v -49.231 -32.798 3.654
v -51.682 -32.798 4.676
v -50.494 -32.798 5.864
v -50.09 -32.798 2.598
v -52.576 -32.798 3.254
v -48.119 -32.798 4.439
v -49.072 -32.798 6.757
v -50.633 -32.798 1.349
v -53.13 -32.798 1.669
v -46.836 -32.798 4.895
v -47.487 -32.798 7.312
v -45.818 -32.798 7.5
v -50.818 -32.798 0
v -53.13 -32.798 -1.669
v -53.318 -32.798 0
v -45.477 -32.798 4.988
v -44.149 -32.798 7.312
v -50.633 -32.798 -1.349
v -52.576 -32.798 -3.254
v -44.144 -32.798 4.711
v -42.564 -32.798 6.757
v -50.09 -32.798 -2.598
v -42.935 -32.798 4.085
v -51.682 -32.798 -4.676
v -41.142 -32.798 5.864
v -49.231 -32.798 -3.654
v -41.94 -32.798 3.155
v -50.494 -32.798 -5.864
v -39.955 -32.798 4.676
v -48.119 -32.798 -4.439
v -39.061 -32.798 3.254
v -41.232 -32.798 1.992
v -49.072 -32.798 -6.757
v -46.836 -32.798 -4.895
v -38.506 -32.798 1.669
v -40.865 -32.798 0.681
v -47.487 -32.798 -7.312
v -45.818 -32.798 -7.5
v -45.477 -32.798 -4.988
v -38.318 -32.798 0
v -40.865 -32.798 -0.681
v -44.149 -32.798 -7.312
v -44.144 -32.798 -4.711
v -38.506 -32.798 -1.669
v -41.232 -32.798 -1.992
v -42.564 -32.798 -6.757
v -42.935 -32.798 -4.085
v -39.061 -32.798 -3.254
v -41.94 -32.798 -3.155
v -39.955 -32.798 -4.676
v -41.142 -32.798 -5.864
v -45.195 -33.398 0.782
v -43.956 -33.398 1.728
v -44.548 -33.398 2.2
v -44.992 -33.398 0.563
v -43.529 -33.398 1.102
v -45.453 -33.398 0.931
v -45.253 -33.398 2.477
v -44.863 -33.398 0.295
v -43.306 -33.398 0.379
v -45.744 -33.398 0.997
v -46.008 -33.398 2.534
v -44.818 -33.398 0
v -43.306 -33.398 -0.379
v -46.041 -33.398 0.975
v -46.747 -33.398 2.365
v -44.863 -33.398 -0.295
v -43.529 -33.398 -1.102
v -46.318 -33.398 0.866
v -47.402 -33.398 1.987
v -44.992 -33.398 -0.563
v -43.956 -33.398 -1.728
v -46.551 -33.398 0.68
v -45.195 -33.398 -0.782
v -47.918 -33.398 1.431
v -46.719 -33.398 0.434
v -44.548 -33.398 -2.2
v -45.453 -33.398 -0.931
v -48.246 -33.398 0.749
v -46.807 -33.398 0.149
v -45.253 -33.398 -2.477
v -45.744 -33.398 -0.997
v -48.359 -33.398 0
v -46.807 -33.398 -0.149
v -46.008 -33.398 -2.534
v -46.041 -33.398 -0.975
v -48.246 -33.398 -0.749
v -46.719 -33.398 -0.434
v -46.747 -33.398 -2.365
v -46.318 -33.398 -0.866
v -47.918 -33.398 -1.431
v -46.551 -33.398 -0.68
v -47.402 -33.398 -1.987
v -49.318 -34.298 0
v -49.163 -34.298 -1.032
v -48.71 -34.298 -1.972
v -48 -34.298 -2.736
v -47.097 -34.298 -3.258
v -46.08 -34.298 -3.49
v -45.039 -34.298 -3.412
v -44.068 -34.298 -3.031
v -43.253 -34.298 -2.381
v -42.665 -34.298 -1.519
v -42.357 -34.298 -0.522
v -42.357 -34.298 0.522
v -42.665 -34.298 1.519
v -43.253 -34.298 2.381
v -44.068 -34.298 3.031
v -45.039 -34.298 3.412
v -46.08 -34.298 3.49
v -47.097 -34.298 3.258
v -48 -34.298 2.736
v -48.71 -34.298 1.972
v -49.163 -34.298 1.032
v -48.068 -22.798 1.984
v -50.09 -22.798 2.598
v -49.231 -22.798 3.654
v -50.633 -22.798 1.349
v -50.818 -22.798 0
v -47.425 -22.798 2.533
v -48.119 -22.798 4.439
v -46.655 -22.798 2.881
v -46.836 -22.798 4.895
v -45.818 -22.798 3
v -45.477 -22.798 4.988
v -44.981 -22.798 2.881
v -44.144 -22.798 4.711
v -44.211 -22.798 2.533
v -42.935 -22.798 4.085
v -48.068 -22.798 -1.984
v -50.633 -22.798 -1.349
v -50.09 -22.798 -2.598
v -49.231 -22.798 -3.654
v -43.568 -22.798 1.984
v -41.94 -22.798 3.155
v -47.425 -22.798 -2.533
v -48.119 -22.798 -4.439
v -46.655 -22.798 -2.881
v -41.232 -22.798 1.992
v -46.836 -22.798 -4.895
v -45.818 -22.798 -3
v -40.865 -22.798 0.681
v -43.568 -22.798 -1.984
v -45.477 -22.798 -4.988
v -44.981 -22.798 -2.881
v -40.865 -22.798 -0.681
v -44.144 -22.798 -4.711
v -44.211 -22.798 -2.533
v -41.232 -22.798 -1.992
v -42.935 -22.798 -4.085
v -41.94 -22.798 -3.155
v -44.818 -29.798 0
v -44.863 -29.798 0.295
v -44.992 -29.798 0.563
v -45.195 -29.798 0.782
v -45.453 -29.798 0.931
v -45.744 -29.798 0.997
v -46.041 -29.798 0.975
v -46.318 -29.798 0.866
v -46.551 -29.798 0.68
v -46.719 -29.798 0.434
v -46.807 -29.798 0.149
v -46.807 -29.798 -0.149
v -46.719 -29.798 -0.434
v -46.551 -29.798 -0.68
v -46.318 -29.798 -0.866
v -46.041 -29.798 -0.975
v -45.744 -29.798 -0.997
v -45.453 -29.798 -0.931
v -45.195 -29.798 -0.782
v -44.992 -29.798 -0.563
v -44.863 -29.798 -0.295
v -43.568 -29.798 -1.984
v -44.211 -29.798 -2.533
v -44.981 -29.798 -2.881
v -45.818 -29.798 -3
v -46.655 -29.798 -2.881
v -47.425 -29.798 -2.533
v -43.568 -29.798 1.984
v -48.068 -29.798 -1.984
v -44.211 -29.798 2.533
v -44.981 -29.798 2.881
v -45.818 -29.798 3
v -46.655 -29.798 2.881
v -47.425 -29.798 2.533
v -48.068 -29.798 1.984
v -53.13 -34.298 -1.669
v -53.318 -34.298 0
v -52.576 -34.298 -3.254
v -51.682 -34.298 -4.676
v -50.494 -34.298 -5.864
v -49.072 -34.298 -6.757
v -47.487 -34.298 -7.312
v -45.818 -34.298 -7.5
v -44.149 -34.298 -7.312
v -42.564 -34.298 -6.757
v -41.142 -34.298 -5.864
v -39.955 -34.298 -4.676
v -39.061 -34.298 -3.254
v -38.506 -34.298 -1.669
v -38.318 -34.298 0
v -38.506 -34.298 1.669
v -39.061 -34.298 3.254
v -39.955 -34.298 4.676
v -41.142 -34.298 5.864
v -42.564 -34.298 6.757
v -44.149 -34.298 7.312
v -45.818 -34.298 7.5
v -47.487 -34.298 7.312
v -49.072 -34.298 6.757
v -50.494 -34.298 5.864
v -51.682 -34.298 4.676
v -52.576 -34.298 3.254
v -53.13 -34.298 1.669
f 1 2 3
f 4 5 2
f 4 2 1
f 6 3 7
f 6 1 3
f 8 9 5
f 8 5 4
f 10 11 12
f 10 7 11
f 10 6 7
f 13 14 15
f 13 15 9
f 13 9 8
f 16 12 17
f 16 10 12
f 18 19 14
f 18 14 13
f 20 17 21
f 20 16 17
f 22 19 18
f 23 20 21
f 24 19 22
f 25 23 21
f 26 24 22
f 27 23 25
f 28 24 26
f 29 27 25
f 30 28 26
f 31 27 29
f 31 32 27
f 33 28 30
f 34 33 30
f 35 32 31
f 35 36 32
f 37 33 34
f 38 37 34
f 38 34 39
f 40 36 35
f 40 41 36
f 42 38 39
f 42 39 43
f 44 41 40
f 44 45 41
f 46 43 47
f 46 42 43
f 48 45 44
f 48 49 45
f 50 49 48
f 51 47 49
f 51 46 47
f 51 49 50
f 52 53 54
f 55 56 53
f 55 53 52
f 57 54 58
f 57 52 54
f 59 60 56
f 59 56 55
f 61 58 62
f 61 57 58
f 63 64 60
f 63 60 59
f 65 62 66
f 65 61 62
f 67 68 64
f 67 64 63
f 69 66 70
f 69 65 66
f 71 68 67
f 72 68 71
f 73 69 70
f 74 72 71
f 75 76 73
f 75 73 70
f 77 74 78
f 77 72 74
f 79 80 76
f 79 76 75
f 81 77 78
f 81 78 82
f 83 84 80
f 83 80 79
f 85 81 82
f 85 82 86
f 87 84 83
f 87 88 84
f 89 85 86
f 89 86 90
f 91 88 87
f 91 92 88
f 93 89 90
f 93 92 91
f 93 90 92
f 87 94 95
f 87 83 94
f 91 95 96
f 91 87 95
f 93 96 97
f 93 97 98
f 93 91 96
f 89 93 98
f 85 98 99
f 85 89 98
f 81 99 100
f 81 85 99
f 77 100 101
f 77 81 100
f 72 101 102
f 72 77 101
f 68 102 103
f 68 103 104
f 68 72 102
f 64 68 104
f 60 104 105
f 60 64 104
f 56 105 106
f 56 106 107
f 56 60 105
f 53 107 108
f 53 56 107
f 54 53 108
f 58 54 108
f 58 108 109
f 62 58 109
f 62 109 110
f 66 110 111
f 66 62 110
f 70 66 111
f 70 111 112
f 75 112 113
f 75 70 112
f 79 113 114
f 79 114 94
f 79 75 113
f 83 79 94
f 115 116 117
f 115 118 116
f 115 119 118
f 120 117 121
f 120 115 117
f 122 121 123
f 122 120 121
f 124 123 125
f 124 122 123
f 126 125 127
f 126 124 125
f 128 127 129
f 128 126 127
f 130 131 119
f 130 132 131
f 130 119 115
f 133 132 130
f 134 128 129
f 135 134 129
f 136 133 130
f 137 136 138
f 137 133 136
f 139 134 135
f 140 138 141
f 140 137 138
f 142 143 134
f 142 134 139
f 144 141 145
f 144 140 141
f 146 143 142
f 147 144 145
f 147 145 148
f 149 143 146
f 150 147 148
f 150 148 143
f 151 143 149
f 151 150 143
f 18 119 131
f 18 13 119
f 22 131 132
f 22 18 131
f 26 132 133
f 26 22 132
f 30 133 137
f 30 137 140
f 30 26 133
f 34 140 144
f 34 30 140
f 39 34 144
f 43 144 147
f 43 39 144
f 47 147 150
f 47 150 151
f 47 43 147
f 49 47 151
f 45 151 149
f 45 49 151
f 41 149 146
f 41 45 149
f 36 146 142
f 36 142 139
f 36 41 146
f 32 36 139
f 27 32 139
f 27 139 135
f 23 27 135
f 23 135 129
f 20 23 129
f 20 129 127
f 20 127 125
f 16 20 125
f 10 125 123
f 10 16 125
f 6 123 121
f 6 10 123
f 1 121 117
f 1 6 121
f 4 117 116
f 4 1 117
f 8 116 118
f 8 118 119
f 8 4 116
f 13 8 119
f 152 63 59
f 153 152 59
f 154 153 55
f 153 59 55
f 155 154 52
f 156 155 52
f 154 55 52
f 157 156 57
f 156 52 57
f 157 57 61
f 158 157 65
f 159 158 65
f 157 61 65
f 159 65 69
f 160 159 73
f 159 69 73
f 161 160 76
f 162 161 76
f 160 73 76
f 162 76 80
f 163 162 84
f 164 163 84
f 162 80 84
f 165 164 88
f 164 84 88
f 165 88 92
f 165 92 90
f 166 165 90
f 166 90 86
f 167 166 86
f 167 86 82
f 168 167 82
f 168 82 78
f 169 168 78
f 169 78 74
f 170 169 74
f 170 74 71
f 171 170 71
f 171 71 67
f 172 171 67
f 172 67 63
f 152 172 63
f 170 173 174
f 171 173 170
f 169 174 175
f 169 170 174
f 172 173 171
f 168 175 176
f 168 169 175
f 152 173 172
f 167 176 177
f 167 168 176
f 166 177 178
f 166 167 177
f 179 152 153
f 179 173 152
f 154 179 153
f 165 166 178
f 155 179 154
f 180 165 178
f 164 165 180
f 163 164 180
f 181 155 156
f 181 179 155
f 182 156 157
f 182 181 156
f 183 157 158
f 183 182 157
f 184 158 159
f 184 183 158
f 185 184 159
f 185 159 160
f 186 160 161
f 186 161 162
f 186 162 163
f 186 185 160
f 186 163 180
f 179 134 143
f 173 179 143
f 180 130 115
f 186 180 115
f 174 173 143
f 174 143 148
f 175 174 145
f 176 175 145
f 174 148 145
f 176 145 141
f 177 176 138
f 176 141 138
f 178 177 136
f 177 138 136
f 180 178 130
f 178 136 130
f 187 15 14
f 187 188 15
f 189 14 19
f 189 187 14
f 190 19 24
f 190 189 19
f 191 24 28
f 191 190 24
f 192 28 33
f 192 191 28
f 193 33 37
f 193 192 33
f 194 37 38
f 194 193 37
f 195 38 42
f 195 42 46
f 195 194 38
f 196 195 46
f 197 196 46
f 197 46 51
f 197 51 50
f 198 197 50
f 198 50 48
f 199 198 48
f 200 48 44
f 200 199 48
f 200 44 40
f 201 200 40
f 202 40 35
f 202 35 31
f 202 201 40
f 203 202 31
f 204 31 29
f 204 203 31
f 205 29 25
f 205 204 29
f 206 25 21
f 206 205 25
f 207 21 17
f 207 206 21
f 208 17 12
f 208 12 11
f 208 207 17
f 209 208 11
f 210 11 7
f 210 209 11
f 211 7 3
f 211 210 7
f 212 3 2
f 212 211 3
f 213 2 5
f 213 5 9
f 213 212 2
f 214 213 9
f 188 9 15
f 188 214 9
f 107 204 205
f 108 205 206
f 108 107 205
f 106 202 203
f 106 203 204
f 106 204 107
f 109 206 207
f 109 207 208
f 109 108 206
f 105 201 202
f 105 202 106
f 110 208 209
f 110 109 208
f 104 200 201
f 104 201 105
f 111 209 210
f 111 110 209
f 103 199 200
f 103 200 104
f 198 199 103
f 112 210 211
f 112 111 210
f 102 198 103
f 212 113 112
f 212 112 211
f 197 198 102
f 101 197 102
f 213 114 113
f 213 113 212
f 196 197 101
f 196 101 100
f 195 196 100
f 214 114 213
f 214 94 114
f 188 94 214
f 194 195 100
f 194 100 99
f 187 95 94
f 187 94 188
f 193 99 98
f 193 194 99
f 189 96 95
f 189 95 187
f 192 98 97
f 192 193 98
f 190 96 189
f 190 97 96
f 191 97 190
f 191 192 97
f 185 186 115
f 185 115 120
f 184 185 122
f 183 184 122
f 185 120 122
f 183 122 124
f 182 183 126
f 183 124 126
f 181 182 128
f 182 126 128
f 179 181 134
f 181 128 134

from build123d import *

# Parameters (mm, degrees)
F3_DEPTH = 7
F4_R     = 1
F5_DEPTH = 25


with BuildPart() as f1:
    # F0 (on Top) → F1 (revolve)
    with BuildSketch(Plane.XY):
        Polygon((-45.818276, -33.398176), (-45.818276, -22.798176), (-50.818276, -22.798176), (-50.818276, -32.798176), (-53.318276, -32.798176), (-53.318276, -34.298176), (-49.318276, -34.298176), (-48.359134, -33.398176), align=None)
    revolve(axis=Axis((-45.818276, -28.098176, 0), (0, -1, 0)))

    # F2 (on face) → F3 (cut)
    with BuildSketch(Plane(origin=(0, -22.798176, 0), x_dir=(-1, 0, 0), z_dir=(0, 1, 0))):
        with BuildLine():
            Line((43.568276, 1.984313), (43.568276, -1.984313))
            ThreePointArc((43.568276, -1.984313), (45.818276, -3), (48.068276, -1.984313))
            Line((48.068276, -1.984313), (48.068276, 1.984313))
            ThreePointArc((48.068276, 1.984313), (45.818276, 3), (43.568276, 1.984313))
        make_face()
    extrude(amount=-F3_DEPTH, mode=Mode.SUBTRACT)

    # F4 (on face) → F5 (cut)
    with BuildSketch(Plane.XZ.offset(33.398176)):
        with Locations((-45.818276, 0)):
            Circle(F4_R)
    extrude(amount=-F5_DEPTH, mode=Mode.SUBTRACT)


solid = f1.part
